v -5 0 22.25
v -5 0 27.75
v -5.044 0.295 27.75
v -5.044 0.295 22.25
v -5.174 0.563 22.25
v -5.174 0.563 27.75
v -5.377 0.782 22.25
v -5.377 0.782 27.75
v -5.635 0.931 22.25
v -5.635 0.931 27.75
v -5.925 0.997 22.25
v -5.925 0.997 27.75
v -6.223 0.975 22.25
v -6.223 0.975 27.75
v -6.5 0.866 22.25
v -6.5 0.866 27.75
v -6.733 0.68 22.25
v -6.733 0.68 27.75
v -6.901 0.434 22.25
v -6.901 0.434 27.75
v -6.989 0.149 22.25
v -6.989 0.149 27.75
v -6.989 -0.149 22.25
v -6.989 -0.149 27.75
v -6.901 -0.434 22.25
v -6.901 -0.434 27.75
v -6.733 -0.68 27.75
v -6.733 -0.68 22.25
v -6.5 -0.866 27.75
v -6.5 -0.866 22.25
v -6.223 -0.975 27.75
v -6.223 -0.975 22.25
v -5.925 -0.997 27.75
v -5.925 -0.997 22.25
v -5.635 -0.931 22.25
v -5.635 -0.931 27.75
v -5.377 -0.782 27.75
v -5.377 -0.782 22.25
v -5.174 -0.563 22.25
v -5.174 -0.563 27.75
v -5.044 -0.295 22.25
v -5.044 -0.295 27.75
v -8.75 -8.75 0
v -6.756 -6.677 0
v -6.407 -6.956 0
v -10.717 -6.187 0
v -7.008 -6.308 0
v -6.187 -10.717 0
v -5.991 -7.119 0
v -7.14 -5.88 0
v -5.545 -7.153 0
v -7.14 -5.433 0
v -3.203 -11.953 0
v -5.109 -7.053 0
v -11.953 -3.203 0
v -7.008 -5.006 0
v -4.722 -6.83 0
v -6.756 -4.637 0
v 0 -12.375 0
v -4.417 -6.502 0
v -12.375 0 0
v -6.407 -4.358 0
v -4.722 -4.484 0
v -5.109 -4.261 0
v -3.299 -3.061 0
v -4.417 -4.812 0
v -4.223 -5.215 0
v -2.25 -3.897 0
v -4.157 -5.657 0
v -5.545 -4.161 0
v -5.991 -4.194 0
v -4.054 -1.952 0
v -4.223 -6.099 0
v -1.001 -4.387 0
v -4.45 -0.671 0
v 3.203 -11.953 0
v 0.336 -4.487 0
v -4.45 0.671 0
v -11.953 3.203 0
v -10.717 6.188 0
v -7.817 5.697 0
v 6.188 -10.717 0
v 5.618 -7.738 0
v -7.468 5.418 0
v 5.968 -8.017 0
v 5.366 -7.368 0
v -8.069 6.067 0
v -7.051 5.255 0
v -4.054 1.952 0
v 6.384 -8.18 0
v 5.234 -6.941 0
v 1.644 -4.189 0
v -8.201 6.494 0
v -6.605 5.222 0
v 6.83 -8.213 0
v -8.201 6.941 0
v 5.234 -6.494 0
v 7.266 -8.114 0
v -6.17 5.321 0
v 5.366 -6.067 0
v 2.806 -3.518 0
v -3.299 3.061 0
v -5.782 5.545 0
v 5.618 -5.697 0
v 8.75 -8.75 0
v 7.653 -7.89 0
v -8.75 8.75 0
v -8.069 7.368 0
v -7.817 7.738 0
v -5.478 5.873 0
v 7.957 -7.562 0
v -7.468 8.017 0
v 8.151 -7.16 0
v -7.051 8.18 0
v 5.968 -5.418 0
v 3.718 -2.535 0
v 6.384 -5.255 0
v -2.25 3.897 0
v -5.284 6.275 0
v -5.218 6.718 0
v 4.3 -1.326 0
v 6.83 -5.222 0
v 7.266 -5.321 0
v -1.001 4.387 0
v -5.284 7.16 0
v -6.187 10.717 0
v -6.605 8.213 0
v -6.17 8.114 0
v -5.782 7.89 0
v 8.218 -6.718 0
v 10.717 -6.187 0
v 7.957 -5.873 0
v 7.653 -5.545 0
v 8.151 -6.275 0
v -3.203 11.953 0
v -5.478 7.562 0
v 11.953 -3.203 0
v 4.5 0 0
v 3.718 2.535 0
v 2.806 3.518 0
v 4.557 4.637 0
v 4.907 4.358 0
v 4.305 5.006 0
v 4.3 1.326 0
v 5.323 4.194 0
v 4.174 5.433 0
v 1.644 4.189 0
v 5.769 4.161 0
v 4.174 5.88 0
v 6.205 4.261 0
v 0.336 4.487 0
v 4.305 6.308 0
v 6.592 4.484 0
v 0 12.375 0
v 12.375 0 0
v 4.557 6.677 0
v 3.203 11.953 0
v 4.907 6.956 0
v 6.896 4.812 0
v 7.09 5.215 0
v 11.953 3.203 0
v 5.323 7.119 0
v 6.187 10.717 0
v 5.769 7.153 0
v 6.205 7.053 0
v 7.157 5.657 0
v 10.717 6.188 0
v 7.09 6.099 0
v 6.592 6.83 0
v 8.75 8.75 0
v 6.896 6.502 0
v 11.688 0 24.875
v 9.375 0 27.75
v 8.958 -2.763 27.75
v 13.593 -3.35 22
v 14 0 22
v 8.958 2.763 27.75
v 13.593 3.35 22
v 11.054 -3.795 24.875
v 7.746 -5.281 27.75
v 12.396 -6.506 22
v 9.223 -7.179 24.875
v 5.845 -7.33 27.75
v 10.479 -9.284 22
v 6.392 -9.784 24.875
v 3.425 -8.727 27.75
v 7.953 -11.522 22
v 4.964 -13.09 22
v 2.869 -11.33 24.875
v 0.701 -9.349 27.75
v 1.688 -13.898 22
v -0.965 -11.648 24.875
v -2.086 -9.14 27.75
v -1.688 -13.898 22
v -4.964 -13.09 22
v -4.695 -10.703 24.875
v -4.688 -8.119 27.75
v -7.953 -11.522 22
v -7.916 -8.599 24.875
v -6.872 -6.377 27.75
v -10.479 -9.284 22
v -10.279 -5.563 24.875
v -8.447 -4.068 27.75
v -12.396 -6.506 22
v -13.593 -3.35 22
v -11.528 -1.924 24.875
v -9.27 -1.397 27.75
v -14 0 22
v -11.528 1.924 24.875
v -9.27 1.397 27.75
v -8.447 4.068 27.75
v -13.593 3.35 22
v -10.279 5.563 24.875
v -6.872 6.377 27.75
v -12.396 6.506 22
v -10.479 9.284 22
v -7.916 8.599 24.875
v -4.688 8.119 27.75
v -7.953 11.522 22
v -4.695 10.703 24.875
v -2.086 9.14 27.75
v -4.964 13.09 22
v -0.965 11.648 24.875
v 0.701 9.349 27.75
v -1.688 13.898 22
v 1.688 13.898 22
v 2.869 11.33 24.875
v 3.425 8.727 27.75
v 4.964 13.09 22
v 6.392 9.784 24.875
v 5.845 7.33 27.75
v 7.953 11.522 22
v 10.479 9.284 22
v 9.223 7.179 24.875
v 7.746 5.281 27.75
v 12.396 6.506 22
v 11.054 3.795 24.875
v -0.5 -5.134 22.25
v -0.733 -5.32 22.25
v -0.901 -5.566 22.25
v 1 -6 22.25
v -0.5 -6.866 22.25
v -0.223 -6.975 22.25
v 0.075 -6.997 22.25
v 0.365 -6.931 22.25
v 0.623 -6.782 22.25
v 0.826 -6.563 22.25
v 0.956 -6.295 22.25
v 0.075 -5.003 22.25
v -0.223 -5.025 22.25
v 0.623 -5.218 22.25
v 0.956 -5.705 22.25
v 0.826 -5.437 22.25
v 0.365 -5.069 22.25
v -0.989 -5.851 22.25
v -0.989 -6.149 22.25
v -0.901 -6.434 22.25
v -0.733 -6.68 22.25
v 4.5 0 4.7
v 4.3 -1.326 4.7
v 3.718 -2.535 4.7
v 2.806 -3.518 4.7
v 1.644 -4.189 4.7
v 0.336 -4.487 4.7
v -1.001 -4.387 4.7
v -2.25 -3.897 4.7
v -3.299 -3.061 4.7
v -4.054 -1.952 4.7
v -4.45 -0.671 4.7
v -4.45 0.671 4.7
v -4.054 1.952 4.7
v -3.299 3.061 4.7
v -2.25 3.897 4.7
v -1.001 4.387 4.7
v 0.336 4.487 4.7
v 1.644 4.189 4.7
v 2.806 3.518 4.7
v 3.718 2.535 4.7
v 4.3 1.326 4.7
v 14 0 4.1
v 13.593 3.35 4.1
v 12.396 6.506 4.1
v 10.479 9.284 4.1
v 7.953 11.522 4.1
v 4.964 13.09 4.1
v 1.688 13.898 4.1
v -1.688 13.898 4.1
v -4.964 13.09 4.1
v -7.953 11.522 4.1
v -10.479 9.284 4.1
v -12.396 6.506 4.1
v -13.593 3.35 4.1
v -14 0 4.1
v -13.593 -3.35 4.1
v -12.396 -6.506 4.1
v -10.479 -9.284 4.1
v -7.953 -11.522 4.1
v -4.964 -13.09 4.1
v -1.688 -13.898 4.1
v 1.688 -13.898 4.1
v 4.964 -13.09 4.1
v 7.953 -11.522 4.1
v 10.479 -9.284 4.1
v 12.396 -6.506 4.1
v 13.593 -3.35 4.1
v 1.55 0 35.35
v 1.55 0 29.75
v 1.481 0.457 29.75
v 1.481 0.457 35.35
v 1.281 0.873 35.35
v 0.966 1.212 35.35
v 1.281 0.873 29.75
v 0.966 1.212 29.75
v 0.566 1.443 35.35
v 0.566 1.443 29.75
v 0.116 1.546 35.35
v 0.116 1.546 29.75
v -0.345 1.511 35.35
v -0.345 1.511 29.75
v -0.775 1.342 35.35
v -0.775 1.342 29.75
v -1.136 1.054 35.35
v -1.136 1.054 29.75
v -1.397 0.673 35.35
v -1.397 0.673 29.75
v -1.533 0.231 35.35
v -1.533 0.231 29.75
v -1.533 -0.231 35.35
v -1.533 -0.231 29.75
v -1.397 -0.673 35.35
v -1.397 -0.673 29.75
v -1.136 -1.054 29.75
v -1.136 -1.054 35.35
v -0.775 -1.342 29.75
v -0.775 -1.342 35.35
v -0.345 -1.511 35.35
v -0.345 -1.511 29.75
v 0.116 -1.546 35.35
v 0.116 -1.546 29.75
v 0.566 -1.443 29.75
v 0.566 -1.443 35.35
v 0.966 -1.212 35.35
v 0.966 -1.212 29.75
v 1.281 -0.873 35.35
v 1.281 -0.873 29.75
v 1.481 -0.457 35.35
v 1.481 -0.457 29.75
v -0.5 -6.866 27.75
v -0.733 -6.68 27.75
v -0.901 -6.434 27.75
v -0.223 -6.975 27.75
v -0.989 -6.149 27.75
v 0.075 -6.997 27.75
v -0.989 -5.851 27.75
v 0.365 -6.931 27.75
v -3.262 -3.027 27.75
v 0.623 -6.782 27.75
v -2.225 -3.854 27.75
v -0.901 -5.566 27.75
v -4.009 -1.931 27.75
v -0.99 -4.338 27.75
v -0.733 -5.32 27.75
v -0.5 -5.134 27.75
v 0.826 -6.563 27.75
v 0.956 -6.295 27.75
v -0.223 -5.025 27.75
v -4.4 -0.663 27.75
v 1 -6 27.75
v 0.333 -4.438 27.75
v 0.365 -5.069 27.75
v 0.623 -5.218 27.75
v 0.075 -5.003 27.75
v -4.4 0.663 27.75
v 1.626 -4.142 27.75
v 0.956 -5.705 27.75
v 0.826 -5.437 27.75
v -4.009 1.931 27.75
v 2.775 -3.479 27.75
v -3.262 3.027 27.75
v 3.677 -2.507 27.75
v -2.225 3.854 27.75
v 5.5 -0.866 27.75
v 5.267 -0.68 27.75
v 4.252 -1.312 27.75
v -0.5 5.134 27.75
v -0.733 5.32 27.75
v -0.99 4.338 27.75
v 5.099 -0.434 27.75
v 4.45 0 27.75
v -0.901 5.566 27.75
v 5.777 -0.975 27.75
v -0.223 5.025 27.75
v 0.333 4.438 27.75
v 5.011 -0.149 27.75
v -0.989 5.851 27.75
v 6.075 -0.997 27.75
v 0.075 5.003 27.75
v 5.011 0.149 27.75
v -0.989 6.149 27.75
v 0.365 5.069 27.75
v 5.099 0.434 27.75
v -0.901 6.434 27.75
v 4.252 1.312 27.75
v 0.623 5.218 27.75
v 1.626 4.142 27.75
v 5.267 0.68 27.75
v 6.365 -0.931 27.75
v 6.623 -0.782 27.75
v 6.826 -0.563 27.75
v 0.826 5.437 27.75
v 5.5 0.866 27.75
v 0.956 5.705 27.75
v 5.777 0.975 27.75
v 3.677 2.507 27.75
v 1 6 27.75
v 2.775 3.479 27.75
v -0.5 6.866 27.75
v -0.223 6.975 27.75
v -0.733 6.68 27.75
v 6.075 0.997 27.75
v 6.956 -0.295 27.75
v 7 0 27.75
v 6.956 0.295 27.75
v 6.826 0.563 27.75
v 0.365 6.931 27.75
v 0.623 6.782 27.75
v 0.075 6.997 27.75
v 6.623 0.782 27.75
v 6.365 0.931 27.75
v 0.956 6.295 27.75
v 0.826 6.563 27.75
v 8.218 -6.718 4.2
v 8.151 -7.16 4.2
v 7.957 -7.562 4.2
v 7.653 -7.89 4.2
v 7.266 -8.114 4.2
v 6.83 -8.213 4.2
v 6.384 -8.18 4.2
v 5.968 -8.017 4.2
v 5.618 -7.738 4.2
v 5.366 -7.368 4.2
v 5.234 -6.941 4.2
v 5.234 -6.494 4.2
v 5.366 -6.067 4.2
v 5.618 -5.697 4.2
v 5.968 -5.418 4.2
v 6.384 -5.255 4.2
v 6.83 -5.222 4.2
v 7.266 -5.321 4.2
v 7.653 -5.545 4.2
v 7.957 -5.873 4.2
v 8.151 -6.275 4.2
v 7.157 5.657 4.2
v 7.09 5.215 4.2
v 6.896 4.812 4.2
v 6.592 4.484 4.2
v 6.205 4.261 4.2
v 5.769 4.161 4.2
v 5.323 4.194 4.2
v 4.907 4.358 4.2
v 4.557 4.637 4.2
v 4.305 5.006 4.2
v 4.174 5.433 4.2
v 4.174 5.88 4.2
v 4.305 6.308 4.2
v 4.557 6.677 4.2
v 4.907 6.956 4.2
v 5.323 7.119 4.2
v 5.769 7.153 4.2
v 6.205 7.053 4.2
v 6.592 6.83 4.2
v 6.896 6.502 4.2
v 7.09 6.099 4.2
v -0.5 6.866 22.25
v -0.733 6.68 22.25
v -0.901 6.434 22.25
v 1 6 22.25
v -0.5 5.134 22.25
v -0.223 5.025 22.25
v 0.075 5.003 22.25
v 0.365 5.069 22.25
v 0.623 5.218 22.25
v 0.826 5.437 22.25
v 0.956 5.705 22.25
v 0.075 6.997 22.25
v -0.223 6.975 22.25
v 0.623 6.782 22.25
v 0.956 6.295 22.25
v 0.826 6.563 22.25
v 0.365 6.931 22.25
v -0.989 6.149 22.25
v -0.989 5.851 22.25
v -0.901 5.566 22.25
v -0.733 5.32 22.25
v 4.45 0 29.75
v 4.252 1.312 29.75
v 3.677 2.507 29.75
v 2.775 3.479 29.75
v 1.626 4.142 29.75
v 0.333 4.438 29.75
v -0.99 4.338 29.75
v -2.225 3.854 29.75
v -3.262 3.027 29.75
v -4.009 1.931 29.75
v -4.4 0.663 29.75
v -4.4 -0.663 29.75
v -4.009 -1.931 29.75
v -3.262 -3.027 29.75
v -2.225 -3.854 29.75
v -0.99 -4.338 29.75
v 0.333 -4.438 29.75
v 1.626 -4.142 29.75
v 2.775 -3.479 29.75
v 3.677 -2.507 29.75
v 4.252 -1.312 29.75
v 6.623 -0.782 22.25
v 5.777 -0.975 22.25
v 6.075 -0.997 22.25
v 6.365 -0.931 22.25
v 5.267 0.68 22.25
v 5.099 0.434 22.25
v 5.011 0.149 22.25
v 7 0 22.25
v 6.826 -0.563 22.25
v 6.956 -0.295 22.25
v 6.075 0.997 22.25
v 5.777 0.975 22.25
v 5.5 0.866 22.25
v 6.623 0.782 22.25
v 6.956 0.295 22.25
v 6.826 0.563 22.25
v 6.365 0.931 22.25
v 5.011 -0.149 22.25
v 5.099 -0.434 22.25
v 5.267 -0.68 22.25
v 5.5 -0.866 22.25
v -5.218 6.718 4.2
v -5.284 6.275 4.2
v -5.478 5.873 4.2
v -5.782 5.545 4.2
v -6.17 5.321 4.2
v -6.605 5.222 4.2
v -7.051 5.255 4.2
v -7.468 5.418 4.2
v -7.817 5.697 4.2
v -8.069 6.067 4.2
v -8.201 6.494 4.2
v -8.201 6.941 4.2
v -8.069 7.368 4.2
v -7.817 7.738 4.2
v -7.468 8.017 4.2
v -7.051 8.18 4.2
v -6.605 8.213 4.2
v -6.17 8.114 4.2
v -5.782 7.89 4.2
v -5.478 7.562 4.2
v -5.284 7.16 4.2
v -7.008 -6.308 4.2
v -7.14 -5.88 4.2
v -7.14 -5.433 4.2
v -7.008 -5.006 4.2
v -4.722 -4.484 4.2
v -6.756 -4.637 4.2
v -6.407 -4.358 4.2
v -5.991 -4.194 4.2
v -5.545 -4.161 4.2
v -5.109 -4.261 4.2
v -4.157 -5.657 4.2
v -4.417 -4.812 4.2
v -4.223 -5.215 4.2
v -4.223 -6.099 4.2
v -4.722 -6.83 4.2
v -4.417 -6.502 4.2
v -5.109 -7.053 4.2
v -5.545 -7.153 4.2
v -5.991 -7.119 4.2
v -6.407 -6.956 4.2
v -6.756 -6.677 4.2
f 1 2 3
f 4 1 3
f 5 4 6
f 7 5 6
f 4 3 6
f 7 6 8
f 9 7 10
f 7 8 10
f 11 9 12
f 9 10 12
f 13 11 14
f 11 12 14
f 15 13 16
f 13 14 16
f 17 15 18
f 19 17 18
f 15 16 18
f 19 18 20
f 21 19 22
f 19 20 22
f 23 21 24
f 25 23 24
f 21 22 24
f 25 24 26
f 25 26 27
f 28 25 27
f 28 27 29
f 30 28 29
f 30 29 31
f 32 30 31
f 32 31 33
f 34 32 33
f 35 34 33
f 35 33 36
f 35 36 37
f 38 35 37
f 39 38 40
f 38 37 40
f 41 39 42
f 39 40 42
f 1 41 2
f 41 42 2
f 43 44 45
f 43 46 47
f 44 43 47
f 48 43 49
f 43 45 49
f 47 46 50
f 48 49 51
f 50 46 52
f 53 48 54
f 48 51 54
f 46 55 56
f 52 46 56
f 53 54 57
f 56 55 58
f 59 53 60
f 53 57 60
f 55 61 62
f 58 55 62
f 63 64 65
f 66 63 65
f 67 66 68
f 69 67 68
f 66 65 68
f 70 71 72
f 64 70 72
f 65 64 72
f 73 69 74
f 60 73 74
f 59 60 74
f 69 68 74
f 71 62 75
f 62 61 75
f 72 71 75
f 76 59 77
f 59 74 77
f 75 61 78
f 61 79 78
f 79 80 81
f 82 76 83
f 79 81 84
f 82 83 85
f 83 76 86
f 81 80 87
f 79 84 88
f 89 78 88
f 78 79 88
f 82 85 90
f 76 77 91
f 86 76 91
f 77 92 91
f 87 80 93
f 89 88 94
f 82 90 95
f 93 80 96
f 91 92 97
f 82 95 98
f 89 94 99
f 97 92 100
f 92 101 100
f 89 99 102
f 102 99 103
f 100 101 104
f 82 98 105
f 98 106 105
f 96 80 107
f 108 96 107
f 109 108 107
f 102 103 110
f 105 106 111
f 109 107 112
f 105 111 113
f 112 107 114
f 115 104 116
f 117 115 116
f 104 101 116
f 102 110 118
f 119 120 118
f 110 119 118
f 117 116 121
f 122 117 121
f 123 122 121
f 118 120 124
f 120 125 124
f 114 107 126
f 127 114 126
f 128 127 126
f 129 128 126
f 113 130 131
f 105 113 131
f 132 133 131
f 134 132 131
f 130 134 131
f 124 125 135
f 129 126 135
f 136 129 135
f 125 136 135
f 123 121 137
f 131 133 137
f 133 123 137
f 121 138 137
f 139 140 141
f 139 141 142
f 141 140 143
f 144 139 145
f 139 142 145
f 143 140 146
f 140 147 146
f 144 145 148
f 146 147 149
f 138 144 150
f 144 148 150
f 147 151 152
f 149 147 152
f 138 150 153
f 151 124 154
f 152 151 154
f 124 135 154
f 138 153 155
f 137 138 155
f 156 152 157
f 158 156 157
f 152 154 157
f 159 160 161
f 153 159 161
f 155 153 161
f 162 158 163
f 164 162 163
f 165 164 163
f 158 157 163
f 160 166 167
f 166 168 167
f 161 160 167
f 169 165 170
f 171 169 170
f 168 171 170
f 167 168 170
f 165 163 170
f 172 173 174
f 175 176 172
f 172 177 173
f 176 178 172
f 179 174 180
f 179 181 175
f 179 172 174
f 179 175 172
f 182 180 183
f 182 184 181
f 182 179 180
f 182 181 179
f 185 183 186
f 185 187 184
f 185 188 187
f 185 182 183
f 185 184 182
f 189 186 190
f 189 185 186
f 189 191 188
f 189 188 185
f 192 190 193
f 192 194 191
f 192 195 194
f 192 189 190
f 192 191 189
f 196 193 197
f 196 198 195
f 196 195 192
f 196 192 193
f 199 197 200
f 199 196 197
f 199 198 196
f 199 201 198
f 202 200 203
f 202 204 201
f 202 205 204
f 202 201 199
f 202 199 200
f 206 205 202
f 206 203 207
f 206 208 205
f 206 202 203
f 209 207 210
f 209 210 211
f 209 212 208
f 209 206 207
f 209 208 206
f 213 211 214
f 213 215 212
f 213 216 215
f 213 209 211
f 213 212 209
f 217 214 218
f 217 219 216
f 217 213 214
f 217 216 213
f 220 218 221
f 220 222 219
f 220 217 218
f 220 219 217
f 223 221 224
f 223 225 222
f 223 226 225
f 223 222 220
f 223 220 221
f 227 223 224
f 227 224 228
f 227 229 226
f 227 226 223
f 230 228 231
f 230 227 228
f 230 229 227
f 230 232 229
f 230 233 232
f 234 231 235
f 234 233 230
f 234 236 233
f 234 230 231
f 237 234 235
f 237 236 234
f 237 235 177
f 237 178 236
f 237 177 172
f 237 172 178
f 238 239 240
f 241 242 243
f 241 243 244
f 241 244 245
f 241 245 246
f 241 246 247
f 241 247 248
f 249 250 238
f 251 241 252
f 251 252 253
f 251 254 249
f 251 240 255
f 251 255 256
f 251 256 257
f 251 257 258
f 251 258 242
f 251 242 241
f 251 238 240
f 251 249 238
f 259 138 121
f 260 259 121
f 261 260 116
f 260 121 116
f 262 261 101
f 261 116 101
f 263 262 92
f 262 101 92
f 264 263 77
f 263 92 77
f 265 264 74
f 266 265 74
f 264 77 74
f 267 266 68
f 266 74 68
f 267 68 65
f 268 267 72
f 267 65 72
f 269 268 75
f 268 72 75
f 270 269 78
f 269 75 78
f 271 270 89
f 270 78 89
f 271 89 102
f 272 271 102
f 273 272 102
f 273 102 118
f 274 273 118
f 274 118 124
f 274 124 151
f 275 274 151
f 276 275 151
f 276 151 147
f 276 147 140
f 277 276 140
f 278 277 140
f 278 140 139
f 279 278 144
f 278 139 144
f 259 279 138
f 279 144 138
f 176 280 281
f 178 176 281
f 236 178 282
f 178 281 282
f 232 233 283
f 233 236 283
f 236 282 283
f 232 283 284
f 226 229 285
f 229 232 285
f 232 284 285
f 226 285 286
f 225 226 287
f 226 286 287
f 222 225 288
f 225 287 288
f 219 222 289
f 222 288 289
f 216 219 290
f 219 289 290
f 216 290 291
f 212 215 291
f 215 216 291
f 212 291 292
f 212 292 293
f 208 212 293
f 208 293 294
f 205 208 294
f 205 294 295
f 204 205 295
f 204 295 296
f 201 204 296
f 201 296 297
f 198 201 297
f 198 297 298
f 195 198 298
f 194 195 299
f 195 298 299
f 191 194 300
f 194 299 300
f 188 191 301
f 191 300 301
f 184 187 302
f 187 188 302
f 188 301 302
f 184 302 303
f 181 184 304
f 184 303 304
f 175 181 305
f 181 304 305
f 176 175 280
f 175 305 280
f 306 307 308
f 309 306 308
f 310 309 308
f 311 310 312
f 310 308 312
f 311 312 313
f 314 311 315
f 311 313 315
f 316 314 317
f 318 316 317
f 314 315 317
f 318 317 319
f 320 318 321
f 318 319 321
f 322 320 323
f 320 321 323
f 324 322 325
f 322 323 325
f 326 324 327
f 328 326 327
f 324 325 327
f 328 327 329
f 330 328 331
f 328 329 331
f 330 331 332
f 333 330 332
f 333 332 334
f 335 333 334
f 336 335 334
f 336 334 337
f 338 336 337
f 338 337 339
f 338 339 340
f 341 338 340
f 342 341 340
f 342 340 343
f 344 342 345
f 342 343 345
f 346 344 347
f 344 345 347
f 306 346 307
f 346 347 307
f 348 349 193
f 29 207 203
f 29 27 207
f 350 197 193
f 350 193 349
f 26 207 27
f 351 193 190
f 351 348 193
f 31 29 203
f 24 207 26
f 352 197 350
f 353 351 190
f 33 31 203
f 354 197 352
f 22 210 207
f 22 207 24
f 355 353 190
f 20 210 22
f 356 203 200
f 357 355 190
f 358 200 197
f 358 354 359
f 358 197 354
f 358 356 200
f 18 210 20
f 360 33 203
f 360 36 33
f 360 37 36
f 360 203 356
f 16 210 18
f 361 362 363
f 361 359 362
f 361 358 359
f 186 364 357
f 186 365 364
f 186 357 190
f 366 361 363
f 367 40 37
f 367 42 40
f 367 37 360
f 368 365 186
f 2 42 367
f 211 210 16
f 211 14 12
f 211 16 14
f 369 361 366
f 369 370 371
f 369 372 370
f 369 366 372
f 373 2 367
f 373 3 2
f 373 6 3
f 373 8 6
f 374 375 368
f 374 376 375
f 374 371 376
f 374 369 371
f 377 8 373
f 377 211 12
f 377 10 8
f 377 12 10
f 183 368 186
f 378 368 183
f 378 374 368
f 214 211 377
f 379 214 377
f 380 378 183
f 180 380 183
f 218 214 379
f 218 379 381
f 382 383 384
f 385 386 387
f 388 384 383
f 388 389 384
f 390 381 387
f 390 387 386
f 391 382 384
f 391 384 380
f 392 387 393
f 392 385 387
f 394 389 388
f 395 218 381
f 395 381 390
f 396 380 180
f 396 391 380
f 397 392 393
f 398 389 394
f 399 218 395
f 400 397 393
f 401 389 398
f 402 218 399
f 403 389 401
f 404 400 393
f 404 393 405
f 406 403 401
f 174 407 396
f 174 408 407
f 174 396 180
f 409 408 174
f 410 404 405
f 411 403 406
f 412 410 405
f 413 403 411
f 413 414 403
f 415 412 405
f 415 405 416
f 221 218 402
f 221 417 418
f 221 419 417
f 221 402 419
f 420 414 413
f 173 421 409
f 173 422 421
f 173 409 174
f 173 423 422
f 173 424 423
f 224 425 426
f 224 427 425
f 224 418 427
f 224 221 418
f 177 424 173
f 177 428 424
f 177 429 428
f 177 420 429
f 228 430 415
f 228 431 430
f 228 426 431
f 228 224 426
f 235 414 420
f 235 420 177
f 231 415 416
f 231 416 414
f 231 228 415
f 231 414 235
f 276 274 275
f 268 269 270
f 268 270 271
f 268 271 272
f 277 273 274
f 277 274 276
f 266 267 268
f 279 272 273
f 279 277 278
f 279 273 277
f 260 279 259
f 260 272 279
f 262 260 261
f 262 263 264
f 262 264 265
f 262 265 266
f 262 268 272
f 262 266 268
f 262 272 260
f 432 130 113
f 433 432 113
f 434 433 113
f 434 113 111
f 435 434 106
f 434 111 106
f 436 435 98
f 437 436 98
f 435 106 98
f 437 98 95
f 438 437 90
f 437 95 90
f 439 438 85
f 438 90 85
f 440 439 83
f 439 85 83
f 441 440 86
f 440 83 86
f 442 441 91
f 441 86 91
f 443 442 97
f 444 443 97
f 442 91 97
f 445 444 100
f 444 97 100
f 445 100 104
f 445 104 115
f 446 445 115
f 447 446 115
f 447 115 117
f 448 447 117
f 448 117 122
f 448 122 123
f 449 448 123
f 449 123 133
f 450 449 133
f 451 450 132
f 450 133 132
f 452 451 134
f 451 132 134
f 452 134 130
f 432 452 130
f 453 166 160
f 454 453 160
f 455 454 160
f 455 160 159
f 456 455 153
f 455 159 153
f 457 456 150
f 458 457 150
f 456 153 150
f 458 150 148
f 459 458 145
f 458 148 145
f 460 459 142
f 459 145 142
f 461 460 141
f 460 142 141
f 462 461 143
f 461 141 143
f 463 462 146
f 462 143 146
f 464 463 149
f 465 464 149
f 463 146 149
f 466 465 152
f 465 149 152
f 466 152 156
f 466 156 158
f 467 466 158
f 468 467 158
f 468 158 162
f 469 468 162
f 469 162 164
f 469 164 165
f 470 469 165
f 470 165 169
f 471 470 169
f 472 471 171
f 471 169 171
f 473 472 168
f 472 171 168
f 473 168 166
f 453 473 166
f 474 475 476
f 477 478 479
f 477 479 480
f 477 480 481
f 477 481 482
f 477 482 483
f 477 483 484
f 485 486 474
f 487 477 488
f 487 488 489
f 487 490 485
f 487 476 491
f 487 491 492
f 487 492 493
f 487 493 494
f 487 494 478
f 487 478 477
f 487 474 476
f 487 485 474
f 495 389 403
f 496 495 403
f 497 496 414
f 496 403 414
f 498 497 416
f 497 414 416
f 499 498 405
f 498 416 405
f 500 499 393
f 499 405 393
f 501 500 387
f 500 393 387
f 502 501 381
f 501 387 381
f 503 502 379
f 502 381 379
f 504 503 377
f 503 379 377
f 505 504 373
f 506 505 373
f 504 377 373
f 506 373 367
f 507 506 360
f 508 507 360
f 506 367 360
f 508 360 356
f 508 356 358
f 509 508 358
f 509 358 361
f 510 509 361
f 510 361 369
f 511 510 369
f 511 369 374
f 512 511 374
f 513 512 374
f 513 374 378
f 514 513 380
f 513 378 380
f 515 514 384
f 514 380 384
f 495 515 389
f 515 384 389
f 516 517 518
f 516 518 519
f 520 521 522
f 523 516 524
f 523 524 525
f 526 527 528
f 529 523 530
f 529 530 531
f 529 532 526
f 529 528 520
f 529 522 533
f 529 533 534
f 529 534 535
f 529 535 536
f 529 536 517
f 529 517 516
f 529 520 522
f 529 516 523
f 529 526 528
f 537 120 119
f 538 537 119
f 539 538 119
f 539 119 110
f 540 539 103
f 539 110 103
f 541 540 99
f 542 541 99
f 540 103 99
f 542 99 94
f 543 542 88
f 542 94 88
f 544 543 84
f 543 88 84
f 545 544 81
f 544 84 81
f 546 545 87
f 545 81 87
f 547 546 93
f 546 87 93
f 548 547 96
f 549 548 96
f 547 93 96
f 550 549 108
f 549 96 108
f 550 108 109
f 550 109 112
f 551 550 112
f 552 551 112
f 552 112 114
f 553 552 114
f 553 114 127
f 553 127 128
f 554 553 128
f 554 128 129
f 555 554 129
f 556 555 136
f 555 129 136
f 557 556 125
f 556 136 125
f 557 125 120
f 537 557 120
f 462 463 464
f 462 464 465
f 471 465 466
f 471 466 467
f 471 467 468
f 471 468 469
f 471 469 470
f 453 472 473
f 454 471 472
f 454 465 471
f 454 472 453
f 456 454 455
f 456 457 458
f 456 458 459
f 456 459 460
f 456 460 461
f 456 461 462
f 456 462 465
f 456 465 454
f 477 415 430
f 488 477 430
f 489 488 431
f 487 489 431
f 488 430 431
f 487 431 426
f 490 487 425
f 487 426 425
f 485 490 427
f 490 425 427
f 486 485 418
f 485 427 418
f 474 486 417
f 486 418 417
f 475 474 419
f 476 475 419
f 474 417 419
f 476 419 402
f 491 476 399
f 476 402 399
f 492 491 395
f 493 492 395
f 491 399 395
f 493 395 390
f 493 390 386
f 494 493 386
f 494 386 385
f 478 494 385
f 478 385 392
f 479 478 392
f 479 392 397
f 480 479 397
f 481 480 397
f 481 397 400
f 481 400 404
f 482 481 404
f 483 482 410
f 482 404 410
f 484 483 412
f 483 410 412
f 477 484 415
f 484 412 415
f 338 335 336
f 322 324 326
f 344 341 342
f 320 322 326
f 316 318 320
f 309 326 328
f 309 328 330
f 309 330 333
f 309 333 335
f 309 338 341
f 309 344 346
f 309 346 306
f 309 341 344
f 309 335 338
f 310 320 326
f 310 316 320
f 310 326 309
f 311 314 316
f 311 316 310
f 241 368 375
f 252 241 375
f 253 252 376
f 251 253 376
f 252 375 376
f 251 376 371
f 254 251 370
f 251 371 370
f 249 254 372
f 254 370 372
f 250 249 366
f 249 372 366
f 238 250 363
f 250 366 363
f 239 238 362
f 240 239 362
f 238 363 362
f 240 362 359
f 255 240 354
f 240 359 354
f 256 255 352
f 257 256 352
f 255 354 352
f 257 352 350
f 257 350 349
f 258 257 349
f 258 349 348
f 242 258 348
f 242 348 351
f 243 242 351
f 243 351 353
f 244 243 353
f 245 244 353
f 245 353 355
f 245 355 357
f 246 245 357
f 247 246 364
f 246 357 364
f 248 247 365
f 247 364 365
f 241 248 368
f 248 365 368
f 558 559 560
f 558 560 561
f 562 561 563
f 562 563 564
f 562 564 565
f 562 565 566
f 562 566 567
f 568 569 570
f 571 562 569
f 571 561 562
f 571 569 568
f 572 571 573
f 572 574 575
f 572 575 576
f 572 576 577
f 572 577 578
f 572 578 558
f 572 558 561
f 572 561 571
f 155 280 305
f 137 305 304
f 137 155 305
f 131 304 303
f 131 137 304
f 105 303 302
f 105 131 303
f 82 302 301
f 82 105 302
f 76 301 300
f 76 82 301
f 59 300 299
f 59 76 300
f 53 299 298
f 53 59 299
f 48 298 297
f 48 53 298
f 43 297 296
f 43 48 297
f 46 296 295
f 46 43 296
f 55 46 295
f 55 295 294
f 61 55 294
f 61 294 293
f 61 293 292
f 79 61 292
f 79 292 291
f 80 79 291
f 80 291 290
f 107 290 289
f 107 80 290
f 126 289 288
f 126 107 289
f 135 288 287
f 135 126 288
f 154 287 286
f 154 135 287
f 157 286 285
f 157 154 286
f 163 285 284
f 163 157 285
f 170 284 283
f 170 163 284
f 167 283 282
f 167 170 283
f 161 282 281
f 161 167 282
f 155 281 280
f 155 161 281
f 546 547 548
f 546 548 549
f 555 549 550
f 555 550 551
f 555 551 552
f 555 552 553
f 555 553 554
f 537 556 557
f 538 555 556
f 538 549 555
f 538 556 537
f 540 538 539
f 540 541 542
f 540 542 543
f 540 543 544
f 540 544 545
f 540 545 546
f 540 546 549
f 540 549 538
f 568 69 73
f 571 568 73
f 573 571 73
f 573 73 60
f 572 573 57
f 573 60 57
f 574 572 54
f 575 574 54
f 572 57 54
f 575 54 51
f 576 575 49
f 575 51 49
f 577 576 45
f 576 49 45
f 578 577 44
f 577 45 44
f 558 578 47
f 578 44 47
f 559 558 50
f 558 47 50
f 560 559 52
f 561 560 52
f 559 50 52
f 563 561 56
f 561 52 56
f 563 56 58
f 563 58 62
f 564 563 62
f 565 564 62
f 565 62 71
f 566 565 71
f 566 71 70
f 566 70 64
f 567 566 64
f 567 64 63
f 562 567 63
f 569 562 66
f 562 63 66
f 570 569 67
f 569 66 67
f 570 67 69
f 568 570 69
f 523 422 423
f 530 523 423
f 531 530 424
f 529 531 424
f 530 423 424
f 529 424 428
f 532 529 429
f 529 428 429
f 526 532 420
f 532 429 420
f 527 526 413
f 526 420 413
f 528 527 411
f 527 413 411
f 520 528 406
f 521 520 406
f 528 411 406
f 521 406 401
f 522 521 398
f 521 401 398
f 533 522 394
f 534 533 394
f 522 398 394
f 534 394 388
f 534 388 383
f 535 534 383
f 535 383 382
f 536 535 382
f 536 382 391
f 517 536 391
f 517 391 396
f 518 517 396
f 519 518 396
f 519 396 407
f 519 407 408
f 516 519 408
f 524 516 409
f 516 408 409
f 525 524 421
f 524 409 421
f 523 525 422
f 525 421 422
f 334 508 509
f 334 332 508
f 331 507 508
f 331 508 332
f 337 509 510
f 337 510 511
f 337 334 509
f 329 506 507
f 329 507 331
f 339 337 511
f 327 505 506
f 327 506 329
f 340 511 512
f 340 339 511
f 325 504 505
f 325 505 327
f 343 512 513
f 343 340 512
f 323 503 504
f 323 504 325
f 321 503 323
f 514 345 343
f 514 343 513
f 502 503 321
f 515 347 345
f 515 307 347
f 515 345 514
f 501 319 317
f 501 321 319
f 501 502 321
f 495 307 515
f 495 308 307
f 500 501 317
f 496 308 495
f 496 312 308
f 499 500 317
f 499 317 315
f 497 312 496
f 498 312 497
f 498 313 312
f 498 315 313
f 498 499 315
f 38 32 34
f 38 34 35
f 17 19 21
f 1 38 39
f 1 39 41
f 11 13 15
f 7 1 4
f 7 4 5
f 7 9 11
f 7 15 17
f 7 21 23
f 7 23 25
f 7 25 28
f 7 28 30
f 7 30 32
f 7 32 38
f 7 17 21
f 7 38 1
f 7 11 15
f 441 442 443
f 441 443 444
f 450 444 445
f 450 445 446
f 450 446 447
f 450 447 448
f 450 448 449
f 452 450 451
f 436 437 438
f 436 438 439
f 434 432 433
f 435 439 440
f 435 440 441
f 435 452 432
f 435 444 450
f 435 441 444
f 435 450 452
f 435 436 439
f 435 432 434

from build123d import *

# Parameters (mm, degrees)
F0_R      = 14
F1_DEPTH  = 27.75
F5_R      = 4.45
F6_DEPTH  = 2
F7_R      = 1.55
F8_DEPTH  = 5.6
F9_R      = 4.5
F12_DEPTH = 4.7
F13_R     = 1.5
F14_DEPTH = 4.2
F15_R     = 1
F16_DEPTH = 5.5


with BuildPart() as f1:
    # F0 (on Top) → F1 (new body)
    with BuildSketch(Plane.XY):
        Circle(F0_R)
    extrude(amount=F1_DEPTH)

    # F3 (on Front) → F4 (revolve, cut)
    with BuildSketch(Plane.XZ):
        Polygon((14, 27.75), (9.375, 27.75), (14, 22), align=None)
    revolve(axis=Axis((0, 0, 13.875), (0, 0, -1)), mode=Mode.SUBTRACT)

    # F5 (on face) → F6 (join)
    with BuildSketch(Plane.XY.offset(27.75)):
        Circle(F5_R)
    extrude(amount=F6_DEPTH)

    # F7 (on face) → F8 (join)
    with BuildSketch(Plane.XY.offset(29.75)):
        Circle(F7_R)
    extrude(amount=F8_DEPTH)

    # F10 (on Front) → F11 (revolve, cut)
    with BuildSketch(Plane.XZ):
        Polygon((14, 0), (14, 4.1), (12.375, 0), align=None)
    revolve(axis=Axis((0, 0, 13.875), (0, 0, -1)), mode=Mode.SUBTRACT)

    # F9 (on face) → F12 (cut)
    with BuildSketch(Plane(origin=(0, 0, 0), x_dir=(1, 0, 0), z_dir=(0, 0, -1))):
        Circle(F9_R)
    extrude(amount=-F12_DEPTH, mode=Mode.SUBTRACT)

    # F13 (on face) → F14 (cut)
    with BuildSketch(Plane(origin=(0, 0, 0), x_dir=(1, 0, 0), z_dir=(0, 0, -1))):
        with Locations((-5.656854, 5.656854)):
            Circle(F13_R)
        with Locations((6.717514, 6.717514)):
            Circle(F13_R)
        with Locations((5.656854, -5.656854)):
            Circle(F13_R)
        with Locations((-6.717514, -6.717514)):
            Circle(F13_R)
    extrude(amount=-F14_DEPTH, mode=Mode.SUBTRACT)

    # F15 (on face) → F16 (cut)
    with BuildSketch(Plane.XY.offset(27.75)):
        with Locations((0, -6)):
            Circle(F15_R)
        with Locations((6, 0)):
            Circle(F15_R)
        with Locations((0, 6)):
            Circle(F15_R)
        with Locations((-6, 0)):
            Circle(F15_R)
    extrude(amount=-F16_DEPTH, mode=Mode.SUBTRACT)


solid = f1.part
